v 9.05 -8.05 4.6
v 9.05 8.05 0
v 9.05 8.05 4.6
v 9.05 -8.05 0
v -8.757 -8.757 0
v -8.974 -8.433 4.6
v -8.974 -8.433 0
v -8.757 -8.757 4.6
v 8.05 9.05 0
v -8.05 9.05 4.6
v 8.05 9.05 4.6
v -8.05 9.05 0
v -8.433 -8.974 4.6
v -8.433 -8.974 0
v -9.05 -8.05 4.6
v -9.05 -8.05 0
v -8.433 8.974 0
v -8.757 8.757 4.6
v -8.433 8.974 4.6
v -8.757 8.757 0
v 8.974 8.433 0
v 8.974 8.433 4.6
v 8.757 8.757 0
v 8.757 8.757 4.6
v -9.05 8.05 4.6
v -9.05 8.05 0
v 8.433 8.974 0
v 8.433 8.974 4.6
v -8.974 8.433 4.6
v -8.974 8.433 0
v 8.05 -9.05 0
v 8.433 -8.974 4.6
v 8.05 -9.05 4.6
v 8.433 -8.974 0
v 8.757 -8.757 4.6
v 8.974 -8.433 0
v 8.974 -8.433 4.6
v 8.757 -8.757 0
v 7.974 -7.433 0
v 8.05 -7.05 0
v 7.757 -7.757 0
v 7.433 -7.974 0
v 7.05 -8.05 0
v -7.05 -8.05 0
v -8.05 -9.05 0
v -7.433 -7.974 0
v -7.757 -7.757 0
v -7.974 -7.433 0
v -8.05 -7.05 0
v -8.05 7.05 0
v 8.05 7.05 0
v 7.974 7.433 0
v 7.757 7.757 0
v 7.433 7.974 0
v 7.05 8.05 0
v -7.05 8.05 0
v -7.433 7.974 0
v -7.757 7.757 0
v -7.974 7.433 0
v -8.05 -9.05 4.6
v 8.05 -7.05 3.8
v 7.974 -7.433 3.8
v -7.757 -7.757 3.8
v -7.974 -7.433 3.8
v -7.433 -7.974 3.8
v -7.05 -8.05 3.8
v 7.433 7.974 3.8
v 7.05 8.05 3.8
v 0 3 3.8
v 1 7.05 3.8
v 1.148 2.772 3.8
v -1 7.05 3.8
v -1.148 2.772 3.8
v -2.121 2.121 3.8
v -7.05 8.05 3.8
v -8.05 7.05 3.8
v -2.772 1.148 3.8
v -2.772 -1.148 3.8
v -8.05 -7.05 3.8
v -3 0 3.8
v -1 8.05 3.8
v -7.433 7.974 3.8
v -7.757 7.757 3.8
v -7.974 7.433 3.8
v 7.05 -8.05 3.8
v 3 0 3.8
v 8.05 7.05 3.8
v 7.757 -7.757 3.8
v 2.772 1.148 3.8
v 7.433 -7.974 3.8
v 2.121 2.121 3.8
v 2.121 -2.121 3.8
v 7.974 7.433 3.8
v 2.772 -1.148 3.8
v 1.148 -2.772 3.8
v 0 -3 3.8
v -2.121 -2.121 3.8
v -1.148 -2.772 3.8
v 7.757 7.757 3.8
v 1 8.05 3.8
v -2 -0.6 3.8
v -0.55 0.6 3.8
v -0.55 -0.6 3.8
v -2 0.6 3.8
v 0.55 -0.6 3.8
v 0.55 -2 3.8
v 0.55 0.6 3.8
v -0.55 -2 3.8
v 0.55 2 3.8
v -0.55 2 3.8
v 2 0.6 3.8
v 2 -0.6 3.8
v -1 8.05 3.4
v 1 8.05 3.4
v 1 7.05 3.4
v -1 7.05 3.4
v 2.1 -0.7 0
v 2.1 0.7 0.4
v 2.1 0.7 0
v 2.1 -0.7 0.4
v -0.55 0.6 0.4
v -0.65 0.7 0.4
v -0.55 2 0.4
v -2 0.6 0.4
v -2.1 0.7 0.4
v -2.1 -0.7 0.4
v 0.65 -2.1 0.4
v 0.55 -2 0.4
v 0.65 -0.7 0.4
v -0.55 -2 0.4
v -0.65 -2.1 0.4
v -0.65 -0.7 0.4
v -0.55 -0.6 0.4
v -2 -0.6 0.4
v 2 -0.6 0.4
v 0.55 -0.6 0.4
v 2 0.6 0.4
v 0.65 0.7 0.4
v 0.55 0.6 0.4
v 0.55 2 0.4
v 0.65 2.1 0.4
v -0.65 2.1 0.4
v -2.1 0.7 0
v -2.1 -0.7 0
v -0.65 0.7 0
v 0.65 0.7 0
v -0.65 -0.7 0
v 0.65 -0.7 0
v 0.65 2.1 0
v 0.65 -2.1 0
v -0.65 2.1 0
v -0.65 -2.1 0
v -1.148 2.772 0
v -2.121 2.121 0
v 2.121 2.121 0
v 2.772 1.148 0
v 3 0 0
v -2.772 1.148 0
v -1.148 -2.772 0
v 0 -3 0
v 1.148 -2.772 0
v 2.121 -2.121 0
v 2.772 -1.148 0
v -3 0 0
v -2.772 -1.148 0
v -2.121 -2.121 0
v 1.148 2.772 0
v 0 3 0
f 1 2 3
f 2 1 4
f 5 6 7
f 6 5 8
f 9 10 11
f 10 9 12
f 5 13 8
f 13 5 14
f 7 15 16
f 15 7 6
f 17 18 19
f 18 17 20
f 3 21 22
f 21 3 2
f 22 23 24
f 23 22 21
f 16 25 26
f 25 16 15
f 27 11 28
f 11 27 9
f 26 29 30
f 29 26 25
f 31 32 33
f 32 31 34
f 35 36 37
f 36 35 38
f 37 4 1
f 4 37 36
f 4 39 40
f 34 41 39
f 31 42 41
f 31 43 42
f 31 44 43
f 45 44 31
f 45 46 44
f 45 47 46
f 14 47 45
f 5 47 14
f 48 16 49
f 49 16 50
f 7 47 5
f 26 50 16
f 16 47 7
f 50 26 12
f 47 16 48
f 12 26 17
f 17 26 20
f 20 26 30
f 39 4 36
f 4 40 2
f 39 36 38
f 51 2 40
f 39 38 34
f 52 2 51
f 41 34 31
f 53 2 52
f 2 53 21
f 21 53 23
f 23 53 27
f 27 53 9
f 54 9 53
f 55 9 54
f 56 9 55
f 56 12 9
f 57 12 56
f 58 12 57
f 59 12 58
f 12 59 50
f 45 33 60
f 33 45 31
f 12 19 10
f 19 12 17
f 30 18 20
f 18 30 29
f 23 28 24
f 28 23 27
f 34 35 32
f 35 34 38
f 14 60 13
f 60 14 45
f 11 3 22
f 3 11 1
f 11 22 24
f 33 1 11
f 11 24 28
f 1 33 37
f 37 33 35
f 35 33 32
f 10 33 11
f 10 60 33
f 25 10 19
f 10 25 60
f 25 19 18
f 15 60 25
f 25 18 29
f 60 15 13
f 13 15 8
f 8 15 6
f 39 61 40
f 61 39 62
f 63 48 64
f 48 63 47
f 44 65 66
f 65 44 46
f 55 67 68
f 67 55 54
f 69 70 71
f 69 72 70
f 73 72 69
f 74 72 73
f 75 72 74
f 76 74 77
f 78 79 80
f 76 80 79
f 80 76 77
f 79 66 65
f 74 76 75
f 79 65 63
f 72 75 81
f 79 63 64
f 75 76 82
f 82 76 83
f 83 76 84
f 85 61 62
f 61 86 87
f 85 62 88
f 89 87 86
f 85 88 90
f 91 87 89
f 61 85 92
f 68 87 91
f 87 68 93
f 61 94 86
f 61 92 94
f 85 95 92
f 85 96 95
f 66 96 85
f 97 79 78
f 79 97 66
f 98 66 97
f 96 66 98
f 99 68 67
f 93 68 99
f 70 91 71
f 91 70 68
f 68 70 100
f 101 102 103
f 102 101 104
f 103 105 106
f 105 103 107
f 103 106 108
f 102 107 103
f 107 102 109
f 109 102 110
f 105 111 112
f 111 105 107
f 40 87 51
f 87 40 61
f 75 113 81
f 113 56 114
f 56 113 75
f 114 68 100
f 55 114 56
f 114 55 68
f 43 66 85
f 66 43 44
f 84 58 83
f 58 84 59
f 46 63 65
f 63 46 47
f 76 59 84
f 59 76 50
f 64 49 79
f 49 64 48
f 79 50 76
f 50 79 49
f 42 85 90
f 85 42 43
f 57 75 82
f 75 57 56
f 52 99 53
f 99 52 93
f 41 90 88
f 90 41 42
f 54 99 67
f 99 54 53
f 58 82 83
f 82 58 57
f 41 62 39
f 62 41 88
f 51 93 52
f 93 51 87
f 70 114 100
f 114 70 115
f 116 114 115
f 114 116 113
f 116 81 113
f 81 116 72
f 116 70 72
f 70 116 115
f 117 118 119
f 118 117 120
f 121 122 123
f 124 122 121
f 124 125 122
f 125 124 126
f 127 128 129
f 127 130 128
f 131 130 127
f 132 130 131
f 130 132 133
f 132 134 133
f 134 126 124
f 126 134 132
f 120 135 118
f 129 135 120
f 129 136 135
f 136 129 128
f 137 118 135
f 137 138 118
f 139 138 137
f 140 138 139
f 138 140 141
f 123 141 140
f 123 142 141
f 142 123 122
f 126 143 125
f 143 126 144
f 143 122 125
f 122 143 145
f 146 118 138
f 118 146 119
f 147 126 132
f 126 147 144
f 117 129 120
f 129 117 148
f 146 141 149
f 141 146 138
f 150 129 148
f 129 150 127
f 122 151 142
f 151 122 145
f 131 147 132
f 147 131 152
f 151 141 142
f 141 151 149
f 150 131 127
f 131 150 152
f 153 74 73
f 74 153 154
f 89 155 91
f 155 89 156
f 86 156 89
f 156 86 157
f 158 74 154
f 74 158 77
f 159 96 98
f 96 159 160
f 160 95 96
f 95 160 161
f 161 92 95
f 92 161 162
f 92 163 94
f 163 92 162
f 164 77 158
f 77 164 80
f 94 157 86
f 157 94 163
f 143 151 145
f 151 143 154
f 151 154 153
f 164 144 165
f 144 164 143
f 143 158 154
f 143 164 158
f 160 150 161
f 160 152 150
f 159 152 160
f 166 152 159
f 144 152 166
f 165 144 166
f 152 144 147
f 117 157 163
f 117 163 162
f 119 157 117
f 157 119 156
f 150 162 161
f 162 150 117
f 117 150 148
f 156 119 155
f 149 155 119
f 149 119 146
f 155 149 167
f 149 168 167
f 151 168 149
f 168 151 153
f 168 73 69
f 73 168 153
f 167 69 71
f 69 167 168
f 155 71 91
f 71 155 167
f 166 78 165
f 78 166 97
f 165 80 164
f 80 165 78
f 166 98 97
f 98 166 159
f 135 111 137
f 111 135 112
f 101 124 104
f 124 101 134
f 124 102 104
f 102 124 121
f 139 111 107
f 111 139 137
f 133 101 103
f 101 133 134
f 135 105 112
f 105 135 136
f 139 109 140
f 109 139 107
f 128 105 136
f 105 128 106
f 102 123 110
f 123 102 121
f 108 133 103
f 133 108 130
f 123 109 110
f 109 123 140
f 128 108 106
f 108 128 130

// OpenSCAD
// file: ../stems/cherry.scad
// origin about center of top of stem

module CherryStem(
	height,
	radius,
	armXWidth, // arm parallel to x axis
	armYWidth, // arm parallel to y axis
	armLength,
	openingTolerance = 0,
	openingHeight = .4
) {
	translate([0, 0, -height / 2])
		difference() {
			cylinder(r = radius, h = height, center = true);
			cube([armLength, armXWidth, height + 1], true);
			cube([armYWidth, armLength, height + 1], true);
			translate([0, 0, -height / 2]) {
				cube([armLength + openingTolerance, armXWidth + openingTolerance, openingHeight * 2], true);
				cube([armYWidth + openingTolerance, armLength + openingTolerance, openingHeight * 2], true);
			}
		}
};
// file: ../caps/lowProfileMinimal.scad
// centered about center of top of switch

module LowProfileMinimalCap(
	bevelRadius,
	height,
	sideWallWidth,
	topWallHeight,
	depth,
	width,
	withOrienter = true,
	withHole = true
) {
	cornerX = width / 2 - bevelRadius;
	cornerY = depth / 2 - bevelRadius;
	innerBevel = bevelRadius; // TODO: make this proportional
	innerCornerX = width / 2 - sideWallWidth - innerBevel;
	innerCornerY = depth / 2 - sideWallWidth - innerBevel;

	orienterHeight = .4;
	orienterWidth = 2;
	orienterDepth = 1;

	translate([0, 0, height / 2]) {
		difference() {
			// TODO: refactor using utils repo
			hull() {
				translate([cornerX, cornerY, 0])
					cylinder(r = bevelRadius, h = height, center = true);
				translate([-cornerX, cornerY, 0])
					cylinder(r = bevelRadius, h = height, center = true);
				translate([-cornerX, -cornerY, 0])
					cylinder(r = bevelRadius, h = height, center = true);
				translate([cornerX, -cornerY, 0])
					cylinder(r = bevelRadius, h = height, center = true);
			}
			if (withHole) {
				hull() {
					translate([innerCornerX, innerCornerY, -topWallHeight])
						cylinder(r = bevelRadius, h = height, center = true);
					translate([-innerCornerX, innerCornerY, -topWallHeight])
						cylinder(r = bevelRadius, h = height, center = true);
					translate([-innerCornerX, -innerCornerY, -topWallHeight])
						cylinder(r = bevelRadius, h = height, center = true);
					translate([innerCornerX, -innerCornerY, -topWallHeight])
						cylinder(r = bevelRadius, h = height, center = true);
				}
			}
		}
		if (withOrienter) {
			translate([0, depth / 2 - sideWallWidth - orienterDepth / 2, height / 2 -topWallHeight - orienterHeight / 2])
				cube([orienterWidth, orienterDepth, orienterHeight], true);
		}
	}
};
// main file
use <../caps/lowProfileMinimal.scad>
use <../stems/cherry.scad>

$fn = $preview ? 8 : 16;

height = 4.6;
topWallHeight = .8;

LowProfileMinimalCap (
	bevelRadius = 1,
	height = height,
	sideWallWidth = 1,
	topWallHeight = topWallHeight,
	depth = 18.1,
	width = 18.1
	// withHole = false
);


translate([0, 0, height - topWallHeight]) CherryStem(
	height = height - topWallHeight,
	radius = 3, 
	armLength = 4, 
	armXWidth = 1.2, 
	armYWidth = 1.1, 
	openingTolerance = .2
);
